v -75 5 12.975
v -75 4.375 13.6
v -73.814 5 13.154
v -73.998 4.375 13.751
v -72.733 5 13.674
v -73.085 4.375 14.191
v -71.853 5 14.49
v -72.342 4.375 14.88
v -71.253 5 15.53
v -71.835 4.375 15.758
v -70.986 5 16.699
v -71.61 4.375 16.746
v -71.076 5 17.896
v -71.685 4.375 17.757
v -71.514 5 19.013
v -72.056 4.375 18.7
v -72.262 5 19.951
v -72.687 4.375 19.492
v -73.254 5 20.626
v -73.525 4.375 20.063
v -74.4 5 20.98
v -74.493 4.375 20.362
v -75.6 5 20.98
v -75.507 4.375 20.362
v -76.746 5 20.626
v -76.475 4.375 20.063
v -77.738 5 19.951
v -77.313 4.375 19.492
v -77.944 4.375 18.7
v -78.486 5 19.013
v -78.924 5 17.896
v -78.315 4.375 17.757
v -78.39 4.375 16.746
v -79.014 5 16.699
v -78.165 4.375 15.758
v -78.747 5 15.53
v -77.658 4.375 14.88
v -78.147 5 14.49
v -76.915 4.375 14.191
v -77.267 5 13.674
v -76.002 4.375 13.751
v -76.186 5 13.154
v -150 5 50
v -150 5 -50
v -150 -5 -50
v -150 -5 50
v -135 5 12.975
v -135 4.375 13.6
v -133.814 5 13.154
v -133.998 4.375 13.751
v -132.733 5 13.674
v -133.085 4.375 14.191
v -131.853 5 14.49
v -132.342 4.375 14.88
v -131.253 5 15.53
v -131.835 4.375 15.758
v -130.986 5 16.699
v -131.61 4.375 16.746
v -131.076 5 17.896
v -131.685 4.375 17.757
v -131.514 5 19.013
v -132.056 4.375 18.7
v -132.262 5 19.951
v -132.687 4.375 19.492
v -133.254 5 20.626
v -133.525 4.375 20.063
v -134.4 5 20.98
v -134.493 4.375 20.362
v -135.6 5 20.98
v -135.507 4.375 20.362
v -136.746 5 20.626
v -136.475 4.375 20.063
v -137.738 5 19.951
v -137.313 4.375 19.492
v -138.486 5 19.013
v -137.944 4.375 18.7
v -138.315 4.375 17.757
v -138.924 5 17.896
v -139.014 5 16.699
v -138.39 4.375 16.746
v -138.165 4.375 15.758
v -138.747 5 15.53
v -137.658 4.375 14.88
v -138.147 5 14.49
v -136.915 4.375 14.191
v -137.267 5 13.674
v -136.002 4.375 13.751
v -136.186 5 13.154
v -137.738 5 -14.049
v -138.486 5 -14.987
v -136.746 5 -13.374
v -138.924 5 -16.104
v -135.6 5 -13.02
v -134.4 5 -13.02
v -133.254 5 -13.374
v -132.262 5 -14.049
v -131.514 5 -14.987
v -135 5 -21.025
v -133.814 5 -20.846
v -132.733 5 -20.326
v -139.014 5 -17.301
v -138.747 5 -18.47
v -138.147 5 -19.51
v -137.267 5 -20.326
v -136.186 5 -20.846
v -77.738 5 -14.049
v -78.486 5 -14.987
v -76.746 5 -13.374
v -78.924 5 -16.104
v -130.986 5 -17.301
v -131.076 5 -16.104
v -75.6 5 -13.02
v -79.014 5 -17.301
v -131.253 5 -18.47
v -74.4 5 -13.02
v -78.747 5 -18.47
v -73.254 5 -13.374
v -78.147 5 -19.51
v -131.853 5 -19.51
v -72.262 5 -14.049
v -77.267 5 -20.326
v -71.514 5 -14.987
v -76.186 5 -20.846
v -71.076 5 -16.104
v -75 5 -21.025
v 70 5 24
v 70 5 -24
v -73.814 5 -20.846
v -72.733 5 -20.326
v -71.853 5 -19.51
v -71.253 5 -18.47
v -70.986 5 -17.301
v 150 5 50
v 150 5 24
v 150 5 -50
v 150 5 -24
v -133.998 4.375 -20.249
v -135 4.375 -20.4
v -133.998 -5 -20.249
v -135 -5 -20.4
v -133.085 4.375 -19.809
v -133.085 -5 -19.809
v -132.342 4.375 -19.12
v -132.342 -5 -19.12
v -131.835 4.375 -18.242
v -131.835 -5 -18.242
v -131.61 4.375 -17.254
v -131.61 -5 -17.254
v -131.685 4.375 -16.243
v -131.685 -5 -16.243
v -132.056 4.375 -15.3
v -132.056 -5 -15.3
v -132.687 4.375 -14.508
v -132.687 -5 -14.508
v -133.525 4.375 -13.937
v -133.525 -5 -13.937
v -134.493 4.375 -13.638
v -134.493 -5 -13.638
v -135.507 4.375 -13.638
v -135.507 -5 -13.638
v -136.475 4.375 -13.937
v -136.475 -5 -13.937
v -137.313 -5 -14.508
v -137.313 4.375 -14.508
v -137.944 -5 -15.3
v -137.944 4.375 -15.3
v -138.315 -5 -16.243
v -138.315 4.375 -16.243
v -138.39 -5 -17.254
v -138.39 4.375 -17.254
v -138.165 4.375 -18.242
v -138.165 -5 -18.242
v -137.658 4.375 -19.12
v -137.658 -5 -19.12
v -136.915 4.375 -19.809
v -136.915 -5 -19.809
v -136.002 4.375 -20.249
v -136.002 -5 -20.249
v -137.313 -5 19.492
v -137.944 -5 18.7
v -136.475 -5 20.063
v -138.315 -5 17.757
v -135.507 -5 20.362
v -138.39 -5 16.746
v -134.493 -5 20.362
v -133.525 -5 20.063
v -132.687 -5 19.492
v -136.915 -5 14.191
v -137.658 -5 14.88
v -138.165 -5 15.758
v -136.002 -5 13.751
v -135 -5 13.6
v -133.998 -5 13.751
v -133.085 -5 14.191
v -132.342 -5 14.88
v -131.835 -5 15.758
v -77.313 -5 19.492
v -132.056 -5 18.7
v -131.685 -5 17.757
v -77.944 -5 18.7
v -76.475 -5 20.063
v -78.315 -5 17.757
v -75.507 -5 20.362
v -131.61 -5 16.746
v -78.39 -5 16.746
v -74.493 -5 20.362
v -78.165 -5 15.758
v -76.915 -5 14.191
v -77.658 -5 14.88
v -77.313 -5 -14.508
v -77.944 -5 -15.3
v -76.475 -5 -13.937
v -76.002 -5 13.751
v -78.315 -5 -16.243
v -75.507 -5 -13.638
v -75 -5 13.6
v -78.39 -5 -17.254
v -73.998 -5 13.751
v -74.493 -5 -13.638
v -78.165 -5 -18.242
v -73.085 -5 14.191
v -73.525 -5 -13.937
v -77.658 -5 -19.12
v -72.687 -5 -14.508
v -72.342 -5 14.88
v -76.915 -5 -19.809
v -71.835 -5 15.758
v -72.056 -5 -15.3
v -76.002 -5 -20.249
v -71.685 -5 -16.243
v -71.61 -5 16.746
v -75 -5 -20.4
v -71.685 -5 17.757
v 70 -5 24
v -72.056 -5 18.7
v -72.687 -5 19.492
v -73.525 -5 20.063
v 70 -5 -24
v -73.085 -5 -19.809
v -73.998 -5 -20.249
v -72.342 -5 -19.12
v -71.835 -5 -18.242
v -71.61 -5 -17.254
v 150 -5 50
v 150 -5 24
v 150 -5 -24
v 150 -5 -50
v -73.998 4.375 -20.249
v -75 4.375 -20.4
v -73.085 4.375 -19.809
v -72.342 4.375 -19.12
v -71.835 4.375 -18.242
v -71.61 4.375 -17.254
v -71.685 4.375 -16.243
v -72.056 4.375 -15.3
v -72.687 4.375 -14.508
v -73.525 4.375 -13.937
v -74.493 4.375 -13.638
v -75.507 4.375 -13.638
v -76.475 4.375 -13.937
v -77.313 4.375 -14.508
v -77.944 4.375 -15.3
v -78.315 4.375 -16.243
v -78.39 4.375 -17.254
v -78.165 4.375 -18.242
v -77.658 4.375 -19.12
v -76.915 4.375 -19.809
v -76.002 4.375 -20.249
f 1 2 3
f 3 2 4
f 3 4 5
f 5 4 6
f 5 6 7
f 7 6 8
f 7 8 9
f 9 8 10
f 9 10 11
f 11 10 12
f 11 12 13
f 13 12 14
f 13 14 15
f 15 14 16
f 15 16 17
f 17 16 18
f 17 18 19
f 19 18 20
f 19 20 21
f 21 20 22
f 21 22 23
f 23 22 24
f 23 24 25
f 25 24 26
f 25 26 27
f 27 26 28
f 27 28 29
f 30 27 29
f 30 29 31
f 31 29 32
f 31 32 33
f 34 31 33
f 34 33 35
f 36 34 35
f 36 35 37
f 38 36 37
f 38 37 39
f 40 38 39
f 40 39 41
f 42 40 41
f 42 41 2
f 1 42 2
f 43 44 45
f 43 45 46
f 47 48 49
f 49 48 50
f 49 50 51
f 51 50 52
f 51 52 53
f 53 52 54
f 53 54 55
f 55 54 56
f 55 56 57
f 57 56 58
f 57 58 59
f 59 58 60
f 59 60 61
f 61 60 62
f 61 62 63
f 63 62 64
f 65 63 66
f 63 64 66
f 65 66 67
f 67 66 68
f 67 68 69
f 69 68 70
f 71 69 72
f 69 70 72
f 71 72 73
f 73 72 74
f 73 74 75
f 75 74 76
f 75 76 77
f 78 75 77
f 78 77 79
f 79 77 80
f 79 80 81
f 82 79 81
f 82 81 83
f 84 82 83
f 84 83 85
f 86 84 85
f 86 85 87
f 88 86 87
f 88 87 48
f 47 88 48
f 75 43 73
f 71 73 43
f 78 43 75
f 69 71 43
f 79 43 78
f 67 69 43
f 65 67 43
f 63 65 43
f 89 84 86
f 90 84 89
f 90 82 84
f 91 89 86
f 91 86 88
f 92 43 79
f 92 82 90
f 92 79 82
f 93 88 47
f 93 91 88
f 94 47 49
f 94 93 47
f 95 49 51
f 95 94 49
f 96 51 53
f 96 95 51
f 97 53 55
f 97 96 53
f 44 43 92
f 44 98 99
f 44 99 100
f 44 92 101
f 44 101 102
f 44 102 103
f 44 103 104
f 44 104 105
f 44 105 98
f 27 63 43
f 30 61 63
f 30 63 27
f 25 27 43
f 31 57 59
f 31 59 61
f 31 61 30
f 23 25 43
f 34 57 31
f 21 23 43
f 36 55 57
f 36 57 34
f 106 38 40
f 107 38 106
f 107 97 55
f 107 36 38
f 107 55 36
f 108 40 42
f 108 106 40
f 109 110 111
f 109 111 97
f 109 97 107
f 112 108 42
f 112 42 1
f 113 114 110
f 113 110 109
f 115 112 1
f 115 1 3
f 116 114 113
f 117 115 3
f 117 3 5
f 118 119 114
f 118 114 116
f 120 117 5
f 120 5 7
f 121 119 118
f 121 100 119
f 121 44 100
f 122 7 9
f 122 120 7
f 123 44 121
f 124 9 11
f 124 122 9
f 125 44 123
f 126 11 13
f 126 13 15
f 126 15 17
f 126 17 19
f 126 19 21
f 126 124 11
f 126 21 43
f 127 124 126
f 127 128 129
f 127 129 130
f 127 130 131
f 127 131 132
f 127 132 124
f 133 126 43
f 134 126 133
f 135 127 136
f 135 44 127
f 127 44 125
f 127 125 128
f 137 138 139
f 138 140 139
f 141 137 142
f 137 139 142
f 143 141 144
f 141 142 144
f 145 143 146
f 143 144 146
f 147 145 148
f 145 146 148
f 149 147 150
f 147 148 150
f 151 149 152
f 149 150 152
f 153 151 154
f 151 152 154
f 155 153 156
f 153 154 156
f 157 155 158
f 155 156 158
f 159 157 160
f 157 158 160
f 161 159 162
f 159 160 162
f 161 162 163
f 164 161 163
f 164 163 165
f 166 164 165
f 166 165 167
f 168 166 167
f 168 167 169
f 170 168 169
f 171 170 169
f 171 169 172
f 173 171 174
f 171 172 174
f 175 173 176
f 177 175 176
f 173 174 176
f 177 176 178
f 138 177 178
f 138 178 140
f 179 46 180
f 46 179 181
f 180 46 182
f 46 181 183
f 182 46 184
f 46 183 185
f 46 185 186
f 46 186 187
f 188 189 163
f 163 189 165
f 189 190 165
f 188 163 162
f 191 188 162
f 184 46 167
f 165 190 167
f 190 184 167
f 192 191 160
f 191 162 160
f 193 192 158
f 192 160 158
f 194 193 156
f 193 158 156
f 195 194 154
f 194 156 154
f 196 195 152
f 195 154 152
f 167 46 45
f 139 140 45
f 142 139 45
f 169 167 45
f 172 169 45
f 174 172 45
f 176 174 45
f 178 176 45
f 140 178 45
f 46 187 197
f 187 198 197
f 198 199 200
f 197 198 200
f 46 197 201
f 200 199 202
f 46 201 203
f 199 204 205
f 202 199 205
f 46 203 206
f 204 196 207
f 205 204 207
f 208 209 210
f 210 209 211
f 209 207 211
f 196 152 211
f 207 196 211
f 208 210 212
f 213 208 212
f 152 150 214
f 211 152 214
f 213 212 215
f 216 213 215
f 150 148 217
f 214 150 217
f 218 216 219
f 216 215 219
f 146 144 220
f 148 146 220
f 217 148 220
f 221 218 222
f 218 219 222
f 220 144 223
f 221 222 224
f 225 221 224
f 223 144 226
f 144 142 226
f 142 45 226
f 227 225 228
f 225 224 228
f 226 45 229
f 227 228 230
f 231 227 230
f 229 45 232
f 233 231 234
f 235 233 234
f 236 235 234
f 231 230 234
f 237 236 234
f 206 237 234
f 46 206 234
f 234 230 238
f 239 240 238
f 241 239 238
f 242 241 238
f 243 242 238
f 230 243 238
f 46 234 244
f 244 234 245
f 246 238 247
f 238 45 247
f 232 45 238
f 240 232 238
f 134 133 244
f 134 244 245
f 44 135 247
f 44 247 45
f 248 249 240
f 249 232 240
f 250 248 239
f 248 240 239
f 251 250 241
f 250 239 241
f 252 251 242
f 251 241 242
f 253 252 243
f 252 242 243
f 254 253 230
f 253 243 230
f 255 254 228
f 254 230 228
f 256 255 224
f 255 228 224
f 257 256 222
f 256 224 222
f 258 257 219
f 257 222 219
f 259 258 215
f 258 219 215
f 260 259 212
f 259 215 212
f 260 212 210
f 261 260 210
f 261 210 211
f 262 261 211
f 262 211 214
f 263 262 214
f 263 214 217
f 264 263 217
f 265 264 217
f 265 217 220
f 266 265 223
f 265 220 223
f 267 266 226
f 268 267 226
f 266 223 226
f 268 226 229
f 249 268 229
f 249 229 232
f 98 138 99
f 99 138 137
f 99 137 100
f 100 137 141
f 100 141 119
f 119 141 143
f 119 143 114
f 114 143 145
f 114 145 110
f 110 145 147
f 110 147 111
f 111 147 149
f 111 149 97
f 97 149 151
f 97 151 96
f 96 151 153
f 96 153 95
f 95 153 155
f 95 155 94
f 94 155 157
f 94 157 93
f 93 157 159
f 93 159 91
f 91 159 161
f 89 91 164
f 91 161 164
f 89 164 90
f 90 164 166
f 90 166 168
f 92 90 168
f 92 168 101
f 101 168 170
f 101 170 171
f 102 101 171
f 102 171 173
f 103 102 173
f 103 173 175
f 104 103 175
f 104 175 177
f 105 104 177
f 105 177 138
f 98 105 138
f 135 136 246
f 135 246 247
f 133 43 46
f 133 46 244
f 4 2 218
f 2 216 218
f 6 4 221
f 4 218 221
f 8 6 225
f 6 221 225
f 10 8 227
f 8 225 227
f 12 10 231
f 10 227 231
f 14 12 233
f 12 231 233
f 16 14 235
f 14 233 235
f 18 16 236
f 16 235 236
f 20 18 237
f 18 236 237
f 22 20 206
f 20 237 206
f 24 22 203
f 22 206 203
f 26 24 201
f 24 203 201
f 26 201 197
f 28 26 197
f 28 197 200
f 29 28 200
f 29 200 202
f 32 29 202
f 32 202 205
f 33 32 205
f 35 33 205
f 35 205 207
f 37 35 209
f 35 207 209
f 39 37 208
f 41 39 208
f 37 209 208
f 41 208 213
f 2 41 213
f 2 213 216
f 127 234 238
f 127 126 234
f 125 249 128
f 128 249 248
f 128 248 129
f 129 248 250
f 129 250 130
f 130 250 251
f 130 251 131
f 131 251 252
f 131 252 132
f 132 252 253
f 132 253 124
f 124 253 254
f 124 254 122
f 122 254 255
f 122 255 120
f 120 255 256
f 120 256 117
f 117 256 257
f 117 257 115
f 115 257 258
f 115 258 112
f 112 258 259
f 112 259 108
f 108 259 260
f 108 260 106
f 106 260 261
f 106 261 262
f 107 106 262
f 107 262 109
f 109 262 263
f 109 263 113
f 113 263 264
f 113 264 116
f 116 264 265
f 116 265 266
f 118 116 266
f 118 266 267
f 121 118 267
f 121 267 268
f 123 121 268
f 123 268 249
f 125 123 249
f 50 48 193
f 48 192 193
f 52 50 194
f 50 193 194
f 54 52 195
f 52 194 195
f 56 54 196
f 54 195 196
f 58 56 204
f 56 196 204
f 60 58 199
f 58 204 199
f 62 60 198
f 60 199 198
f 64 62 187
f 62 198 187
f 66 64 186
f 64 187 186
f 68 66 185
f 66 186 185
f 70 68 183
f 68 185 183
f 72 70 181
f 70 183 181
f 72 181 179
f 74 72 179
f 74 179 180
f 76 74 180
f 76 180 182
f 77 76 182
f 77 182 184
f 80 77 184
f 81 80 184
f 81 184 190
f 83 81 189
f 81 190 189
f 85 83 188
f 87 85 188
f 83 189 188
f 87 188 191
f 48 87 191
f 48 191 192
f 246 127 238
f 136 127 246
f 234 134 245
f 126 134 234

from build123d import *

# Parameters (mm, degrees)
RESSALTO_EXTRUS_O1_DEPTH        = 5
FURO_ROSCADO_DE_M82_D           = 6.8
FURO_ROSCADO_DE_M82_CSINK_D     = 8.05
FURO_ROSCADO_DE_M82_CSINK_ANGLE = 90


with BuildPart() as part:
    # Esboço1 → Ressalto-extrusão1 (new, symmetric)
    with BuildSketch(Plane(origin=(0, 0, 0), x_dir=(1, 0, 0), z_dir=(0, 1, 0))):
        Polygon((70, 24), (150, 24), (150, 50), (-150, 50), (-150, -50), (150, -50), (150, -24), (70, -24), align=None)
    extrude(amount=RESSALTO_EXTRUS_O1_DEPTH, both=True)

    # Furo roscado de M82 (through all)
    with Locations(Plane(origin=(-135, 5, -17), x_dir=(0, 0, 1), z_dir=(0, 1, 0))):
        with Locations((0, 0), (34, 0), (34, 60), (0, 60)):
            CounterSinkHole(FURO_ROSCADO_DE_M82_D / 2, FURO_ROSCADO_DE_M82_CSINK_D / 2, counter_sink_angle=FURO_ROSCADO_DE_M82_CSINK_ANGLE)


solid = part.part
